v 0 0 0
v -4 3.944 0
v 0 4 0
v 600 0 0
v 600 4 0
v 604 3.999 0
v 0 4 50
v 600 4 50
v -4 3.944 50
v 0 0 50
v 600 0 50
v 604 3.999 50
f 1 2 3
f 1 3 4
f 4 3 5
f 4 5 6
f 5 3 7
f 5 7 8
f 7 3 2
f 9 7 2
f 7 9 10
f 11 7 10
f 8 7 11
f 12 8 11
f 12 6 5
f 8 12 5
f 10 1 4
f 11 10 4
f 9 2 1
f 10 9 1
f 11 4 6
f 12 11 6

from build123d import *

# Parameters (mm, degrees)
F0_W     = 600
F0_H     = 4
F1_DEPTH = 50


with BuildPart() as f1:
    # F0 (on Top) → F1 (new body)
    with BuildSketch(Plane.XY):
        Polygon((600, 4), (600, 0), (604, 3.998755), align=None)
        with Locations((300, 2)):
            Rectangle(F0_W, F0_H)
        Polygon((-4, 3.943877), (0, 0), (0, 4), align=None)
    extrude(amount=F1_DEPTH)


solid = f1.part
